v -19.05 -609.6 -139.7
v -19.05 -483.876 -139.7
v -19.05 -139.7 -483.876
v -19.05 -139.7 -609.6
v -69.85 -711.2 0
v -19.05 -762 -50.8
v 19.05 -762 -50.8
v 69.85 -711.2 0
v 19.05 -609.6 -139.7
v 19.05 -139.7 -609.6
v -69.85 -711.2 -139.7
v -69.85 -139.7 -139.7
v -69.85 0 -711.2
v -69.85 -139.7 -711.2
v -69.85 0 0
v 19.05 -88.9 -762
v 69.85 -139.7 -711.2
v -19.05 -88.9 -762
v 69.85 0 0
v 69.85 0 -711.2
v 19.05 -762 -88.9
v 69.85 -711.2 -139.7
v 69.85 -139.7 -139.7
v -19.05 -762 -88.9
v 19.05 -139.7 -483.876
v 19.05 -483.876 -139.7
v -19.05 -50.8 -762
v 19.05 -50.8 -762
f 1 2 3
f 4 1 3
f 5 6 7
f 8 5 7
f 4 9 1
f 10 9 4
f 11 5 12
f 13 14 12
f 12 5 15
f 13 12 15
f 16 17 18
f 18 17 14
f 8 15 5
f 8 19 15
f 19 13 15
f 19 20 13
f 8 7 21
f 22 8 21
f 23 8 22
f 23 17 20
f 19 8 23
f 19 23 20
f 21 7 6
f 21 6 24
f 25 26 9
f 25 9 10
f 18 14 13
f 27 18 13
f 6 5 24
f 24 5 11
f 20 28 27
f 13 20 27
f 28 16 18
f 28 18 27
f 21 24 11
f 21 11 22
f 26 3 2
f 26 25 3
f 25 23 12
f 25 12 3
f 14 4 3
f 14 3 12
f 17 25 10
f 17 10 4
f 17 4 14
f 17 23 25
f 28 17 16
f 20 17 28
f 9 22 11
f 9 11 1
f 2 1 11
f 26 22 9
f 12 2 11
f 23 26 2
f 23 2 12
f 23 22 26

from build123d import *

# Parameters (mm, degrees)
F1_DEPTH = 69.85
F2_SIZE2 = 50.8
F2_SIZE  = 50.8
F4_DEPTH = 19.05


with BuildPart() as f1:
    # F0 (on Right) → F1 (new body, symmetric)
    with BuildSketch(Plane.YZ):
        Polygon((0, 0), (-762, 0), (-762, -139.7), (-139.7, -139.7), (-139.7, -762), (0, -762), align=None)
    extrude(amount=F1_DEPTH, both=True)

    # F2
    f2_edges = [f1.edges().sort_by_distance(p)[0] for p in [
        (0, -762, -139.7),
        (69.85, -69.85, -762),
        (0, -139.7, -762),
        (-69.85, -69.85, -762),
        (0, 0, -762),
        (-69.85, -762, -69.85),
        (0, -762, 0),
        (69.85, -762, -69.85),
    ]]
    chamfer(f2_edges, length=F2_SIZE, length2=F2_SIZE2)

    # F3 (on Right) → F4 (join, symmetric)
    with BuildSketch(Plane.YZ):
        Polygon((-483.876414, -139.7), (-609.6, -139.7), (-139.7, -609.6), (-139.7, -483.876414), align=None)
    extrude(amount=F4_DEPTH, both=True)


solid = f1.part
